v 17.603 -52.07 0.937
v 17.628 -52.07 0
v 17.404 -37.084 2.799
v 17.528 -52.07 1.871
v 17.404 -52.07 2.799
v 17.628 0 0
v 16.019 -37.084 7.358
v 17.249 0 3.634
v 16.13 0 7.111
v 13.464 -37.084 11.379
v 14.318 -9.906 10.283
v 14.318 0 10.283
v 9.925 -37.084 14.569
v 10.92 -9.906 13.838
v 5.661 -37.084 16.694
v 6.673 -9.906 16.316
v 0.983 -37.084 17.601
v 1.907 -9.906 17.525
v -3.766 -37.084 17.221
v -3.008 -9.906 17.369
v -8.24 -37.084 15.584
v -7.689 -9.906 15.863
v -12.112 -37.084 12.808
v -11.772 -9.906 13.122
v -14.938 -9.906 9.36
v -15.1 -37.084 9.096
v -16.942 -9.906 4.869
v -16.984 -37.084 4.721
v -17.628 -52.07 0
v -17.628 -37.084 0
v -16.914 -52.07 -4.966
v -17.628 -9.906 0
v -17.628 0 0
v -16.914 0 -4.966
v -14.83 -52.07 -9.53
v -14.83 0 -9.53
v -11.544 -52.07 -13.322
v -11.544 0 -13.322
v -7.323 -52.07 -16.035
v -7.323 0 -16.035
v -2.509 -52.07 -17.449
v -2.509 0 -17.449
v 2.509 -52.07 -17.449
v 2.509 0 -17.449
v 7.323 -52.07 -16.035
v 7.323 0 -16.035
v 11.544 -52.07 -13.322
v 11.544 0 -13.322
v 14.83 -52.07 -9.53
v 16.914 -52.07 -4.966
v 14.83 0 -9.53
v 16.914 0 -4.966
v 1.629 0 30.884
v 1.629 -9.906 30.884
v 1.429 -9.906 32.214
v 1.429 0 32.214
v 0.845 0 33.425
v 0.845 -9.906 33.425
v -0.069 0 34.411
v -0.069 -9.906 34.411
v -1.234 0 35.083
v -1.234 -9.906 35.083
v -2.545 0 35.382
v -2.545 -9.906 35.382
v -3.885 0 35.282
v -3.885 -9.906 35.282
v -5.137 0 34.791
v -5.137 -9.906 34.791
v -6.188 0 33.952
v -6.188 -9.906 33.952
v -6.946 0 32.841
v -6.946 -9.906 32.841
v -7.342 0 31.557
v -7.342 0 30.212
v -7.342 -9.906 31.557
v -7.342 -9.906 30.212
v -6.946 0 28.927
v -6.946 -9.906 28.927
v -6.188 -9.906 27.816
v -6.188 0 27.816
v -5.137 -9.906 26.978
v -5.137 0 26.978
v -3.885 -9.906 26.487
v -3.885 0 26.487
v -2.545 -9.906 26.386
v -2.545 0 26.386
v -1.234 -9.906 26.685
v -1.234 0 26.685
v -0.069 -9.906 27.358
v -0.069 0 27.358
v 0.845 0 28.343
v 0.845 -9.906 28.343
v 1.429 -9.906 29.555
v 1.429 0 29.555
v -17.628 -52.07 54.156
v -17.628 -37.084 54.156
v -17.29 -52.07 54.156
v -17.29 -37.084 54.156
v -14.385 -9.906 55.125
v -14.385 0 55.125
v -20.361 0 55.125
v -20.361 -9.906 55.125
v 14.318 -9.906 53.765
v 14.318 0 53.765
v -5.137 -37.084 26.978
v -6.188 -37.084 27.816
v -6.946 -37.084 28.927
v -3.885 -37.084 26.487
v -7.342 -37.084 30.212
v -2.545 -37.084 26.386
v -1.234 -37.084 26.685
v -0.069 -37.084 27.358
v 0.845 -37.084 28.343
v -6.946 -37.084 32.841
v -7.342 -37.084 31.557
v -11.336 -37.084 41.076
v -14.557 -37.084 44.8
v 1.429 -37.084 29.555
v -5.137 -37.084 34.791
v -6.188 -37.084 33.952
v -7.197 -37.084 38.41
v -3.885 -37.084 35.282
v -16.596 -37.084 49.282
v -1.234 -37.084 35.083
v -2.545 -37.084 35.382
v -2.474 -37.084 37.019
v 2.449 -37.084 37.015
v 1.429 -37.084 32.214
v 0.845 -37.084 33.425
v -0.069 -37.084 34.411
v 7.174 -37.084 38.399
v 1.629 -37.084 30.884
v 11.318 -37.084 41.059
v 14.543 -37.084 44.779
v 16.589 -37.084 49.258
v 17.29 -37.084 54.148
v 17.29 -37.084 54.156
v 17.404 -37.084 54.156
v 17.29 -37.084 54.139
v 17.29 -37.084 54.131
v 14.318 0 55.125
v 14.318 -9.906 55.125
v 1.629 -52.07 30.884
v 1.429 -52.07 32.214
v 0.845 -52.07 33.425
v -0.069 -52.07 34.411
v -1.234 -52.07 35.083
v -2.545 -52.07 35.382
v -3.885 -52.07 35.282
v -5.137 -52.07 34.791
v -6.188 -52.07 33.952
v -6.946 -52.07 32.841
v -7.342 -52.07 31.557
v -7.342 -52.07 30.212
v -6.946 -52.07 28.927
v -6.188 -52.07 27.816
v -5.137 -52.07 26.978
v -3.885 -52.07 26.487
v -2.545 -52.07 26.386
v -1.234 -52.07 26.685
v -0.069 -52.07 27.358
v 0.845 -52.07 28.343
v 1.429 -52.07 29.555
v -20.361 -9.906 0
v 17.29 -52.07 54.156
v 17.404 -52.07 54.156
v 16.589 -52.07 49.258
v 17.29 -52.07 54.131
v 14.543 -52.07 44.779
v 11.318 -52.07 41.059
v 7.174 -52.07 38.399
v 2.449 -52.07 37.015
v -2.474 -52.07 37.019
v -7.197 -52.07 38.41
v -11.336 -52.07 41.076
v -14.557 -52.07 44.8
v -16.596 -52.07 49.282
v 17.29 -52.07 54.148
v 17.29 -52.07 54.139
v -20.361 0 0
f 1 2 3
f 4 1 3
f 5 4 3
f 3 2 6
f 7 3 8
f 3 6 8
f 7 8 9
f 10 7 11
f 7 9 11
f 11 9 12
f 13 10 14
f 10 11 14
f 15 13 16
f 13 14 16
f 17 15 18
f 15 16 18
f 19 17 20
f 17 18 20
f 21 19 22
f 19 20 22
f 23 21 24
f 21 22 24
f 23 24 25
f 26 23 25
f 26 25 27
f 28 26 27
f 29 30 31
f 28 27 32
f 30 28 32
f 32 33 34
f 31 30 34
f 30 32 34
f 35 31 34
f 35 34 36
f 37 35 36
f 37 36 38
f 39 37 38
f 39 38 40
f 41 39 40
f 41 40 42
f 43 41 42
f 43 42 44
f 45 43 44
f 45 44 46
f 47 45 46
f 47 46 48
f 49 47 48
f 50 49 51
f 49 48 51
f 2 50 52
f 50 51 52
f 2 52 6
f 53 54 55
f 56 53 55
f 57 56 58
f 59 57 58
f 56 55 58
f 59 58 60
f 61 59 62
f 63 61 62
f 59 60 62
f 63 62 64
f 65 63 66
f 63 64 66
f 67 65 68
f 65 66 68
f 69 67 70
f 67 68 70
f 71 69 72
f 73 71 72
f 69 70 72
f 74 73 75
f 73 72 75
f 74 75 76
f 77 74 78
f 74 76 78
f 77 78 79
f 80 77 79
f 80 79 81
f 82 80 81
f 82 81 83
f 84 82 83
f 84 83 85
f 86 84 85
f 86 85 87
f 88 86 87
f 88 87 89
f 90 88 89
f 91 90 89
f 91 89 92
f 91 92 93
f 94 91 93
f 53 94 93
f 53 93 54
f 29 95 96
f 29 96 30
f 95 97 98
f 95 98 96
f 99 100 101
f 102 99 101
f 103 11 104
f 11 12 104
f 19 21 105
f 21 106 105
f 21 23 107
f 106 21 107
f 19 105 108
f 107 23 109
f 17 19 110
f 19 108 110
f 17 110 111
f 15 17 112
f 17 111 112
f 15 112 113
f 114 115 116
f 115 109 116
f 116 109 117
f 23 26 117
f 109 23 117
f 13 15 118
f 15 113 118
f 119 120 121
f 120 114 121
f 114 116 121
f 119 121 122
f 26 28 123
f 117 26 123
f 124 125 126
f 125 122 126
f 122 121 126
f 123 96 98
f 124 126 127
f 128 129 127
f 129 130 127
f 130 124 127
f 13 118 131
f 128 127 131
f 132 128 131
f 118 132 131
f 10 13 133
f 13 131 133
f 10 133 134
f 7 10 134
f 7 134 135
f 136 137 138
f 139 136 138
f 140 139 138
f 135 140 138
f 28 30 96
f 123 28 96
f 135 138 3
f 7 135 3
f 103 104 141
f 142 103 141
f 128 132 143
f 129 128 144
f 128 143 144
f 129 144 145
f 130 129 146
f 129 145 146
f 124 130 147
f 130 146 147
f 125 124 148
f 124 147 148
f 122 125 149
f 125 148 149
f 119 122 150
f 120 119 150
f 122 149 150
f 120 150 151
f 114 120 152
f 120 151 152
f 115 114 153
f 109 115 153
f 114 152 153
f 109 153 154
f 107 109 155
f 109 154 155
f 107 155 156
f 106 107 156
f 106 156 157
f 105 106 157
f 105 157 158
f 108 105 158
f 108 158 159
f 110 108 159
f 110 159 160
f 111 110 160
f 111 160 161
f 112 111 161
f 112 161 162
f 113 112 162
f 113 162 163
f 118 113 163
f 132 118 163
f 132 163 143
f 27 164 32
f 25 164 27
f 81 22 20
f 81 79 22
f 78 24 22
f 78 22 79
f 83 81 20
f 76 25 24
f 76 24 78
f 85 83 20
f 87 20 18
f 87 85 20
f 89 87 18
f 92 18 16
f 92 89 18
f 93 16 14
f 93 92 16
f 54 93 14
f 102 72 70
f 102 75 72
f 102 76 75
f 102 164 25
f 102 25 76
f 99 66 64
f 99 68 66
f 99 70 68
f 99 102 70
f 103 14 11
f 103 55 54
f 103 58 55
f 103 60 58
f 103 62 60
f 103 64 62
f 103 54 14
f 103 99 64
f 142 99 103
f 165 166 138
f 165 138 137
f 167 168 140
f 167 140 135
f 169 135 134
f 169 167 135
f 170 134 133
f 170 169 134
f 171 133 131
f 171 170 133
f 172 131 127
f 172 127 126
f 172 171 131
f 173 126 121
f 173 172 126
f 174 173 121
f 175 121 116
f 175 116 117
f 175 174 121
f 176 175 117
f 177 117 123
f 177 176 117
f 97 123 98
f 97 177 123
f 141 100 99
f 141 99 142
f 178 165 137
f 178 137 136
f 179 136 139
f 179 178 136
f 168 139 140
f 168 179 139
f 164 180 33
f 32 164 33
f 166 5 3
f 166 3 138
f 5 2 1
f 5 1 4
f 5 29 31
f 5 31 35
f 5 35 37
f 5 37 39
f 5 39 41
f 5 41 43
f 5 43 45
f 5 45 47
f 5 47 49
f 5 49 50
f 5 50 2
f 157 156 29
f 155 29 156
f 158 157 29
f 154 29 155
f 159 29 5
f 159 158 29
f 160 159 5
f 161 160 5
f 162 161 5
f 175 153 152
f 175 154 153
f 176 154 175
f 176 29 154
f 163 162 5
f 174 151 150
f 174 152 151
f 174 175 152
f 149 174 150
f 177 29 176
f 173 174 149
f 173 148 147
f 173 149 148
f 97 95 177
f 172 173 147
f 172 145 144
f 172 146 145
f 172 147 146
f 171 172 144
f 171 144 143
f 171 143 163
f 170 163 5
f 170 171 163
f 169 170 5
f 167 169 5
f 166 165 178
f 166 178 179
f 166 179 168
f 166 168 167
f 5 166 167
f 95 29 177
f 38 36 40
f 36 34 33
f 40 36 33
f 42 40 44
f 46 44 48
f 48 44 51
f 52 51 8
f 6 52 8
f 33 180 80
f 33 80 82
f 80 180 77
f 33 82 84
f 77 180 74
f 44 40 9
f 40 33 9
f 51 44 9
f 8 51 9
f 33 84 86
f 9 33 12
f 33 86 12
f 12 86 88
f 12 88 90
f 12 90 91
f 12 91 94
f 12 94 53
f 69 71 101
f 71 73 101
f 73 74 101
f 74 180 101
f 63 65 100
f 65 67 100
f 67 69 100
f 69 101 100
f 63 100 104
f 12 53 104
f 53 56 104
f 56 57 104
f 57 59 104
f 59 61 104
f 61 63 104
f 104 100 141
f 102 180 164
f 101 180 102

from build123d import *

# Parameters (mm, degrees)
F0_R     = 17.628013
F1_DEPTH = 52.07
F6_DEPTH = 14.986
F2_W     = 34.678817
F2_H     = 55.124529
F7_DEPTH = 9.906
F8_R     = 4.510696
F9_DEPTH = 2514.6


with BuildPart() as f1:
    # F0 (on Front) → F1 (new body)
    with BuildSketch(Plane.XZ):
        Circle(F0_R)
    extrude(amount=F1_DEPTH)

    # F4 (on face) → F6 (join)
    with BuildSketch(Plane.XZ.offset(52.07)):
        with BuildLine():
            ThreePointArc((17.29034, 54.155942), (17.290353, 54.143466), (17.290358, 54.13099))
            ThreePointArc((17.290358, 54.13099), (-0.012476, 36.840637), (-17.29034, 54.155942))
            Line((-17.29034, 54.155942), (-17.628013, 54.155942))
            Line((-17.628013, 54.155942), (-17.628013, 0))
            ThreePointArc((-17.628013, 0), (-1.404154, 17.572), (17.404318, 2.799385))
            Line((17.404318, 2.799385), (17.404318, 54.155942))
            Line((17.404318, 54.155942), (17.29034, 54.155942))
        make_face()
    extrude(amount=-F6_DEPTH)

    # F5 (on face) + F2 (on Front) → F7 (join)
    with BuildSketch(Plane.XZ):
        with BuildLine():
            ThreePointArc((14.317841, 53.7648), (-0.680686, 40.781741), (-14.384703, 55.124529))
            Line((-14.384703, 55.124529), (-20.360976, 55.124529))
            Line((-20.360976, 55.124529), (-20.360976, 0))
            Line((-20.360976, 0), (14.317841, 0))
            Line((14.317841, 0), (14.317841, 53.7648))
        make_face()
    with BuildSketch(Plane.XZ):
        with Locations((-3.021568, 27.562264)):
            Rectangle(F2_W, F2_H)
    extrude(amount=F7_DEPTH)

    # F8 (on face) → F9 (cut)
    with BuildSketch(Plane.XZ.offset(52.07)):
        with Locations((-2.881597, 30.884339)):
            Circle(F8_R)
    extrude(amount=-F9_DEPTH, mode=Mode.SUBTRACT)


solid = f1.part
